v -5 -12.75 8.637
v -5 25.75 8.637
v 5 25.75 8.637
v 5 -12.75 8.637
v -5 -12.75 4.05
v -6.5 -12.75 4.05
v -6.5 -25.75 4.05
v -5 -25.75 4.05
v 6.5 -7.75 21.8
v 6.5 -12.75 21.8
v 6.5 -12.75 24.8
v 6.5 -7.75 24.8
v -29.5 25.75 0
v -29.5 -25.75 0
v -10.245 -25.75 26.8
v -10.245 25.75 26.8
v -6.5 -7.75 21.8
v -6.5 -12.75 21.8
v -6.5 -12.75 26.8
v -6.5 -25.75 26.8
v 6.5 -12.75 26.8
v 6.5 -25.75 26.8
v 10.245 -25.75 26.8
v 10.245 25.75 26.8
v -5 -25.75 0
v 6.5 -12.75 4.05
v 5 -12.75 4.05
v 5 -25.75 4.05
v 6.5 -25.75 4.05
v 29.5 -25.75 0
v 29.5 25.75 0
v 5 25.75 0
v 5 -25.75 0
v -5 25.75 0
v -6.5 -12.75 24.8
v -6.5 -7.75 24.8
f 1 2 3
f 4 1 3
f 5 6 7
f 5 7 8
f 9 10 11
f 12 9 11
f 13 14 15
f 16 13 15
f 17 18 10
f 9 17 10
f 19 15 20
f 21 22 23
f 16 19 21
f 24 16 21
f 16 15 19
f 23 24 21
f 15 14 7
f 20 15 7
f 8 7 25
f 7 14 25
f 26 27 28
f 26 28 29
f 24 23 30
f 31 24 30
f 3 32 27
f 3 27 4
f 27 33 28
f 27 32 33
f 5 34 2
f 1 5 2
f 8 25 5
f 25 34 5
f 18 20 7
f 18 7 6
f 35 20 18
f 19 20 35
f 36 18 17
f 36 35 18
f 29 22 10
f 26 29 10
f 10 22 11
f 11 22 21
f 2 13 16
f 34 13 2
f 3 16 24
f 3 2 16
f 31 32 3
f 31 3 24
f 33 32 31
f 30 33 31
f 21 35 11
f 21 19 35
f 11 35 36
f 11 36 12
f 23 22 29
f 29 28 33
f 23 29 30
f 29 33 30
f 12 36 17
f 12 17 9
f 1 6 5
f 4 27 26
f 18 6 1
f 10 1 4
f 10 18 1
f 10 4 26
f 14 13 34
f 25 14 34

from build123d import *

# Parameters (mm, degrees)
F0_W      = 59
F0_H      = 51.5
F1_DEPTH  = 26.8
F2_W      = 10
F2_H      = 13
F3_DEPTH  = 26.8
F4_W      = 12.999998
F4_H      = 13
F5_DEPTH  = 22.75
F7_DEPTH  = 51.5
F9_DEPTH  = 51.5
F10_W     = 10
F10_H     = 8.67
F11_DEPTH = 38.5
F12_W     = 13
F12_H     = 3
F13_DEPTH = 5


with BuildPart() as f1:
    # F0 (on Top) → F1 (new body)
    with BuildSketch(Plane.XY):
        Rectangle(F0_W, F0_H)
    extrude(amount=F1_DEPTH)

    # F2 (on face) → F3 (cut)
    with BuildSketch(Plane.XY.offset(26.8)):
        with Locations((0, -19.25)):
            Rectangle(F2_W, F2_H)
    extrude(amount=-F3_DEPTH, mode=Mode.SUBTRACT)

    # F4 (on face) → F5 (cut)
    with BuildSketch(Plane.XY.offset(26.8)):
        with Locations((-1e-06, -19.25)):
            Rectangle(F4_W, F4_H)
    extrude(amount=-F5_DEPTH, mode=Mode.SUBTRACT)

    # F6 (on face) → F7 (cut)
    with BuildSketch(Plane.XZ.offset(25.75)):
        Polygon((-29.5, 26.8), (-29.5, 0), (-10.244871, 26.8), align=None)
    extrude(amount=-F7_DEPTH, mode=Mode.SUBTRACT)

    # F8 (on face) → F9 (cut)
    with BuildSketch(Plane.XZ.offset(25.75)):
        Polygon((10.244871, 26.8), (29.5, 0), (29.5, 26.8), align=None)
    extrude(amount=-F9_DEPTH, mode=Mode.SUBTRACT)

    # F10 (on face) → F11 (cut)
    with BuildSketch(Plane.XZ.offset(12.75)):
        with Locations((0, 4.302397)):
            Rectangle(F10_W, F10_H)
    extrude(amount=-F11_DEPTH, mode=Mode.SUBTRACT)

    # F12 (on face) → F13 (cut)
    with BuildSketch(Plane.XZ.offset(12.75)):
        with Locations((0, 23.3)):
            Rectangle(F12_W, F12_H)
    extrude(amount=-F13_DEPTH, mode=Mode.SUBTRACT)


solid = f1.part
